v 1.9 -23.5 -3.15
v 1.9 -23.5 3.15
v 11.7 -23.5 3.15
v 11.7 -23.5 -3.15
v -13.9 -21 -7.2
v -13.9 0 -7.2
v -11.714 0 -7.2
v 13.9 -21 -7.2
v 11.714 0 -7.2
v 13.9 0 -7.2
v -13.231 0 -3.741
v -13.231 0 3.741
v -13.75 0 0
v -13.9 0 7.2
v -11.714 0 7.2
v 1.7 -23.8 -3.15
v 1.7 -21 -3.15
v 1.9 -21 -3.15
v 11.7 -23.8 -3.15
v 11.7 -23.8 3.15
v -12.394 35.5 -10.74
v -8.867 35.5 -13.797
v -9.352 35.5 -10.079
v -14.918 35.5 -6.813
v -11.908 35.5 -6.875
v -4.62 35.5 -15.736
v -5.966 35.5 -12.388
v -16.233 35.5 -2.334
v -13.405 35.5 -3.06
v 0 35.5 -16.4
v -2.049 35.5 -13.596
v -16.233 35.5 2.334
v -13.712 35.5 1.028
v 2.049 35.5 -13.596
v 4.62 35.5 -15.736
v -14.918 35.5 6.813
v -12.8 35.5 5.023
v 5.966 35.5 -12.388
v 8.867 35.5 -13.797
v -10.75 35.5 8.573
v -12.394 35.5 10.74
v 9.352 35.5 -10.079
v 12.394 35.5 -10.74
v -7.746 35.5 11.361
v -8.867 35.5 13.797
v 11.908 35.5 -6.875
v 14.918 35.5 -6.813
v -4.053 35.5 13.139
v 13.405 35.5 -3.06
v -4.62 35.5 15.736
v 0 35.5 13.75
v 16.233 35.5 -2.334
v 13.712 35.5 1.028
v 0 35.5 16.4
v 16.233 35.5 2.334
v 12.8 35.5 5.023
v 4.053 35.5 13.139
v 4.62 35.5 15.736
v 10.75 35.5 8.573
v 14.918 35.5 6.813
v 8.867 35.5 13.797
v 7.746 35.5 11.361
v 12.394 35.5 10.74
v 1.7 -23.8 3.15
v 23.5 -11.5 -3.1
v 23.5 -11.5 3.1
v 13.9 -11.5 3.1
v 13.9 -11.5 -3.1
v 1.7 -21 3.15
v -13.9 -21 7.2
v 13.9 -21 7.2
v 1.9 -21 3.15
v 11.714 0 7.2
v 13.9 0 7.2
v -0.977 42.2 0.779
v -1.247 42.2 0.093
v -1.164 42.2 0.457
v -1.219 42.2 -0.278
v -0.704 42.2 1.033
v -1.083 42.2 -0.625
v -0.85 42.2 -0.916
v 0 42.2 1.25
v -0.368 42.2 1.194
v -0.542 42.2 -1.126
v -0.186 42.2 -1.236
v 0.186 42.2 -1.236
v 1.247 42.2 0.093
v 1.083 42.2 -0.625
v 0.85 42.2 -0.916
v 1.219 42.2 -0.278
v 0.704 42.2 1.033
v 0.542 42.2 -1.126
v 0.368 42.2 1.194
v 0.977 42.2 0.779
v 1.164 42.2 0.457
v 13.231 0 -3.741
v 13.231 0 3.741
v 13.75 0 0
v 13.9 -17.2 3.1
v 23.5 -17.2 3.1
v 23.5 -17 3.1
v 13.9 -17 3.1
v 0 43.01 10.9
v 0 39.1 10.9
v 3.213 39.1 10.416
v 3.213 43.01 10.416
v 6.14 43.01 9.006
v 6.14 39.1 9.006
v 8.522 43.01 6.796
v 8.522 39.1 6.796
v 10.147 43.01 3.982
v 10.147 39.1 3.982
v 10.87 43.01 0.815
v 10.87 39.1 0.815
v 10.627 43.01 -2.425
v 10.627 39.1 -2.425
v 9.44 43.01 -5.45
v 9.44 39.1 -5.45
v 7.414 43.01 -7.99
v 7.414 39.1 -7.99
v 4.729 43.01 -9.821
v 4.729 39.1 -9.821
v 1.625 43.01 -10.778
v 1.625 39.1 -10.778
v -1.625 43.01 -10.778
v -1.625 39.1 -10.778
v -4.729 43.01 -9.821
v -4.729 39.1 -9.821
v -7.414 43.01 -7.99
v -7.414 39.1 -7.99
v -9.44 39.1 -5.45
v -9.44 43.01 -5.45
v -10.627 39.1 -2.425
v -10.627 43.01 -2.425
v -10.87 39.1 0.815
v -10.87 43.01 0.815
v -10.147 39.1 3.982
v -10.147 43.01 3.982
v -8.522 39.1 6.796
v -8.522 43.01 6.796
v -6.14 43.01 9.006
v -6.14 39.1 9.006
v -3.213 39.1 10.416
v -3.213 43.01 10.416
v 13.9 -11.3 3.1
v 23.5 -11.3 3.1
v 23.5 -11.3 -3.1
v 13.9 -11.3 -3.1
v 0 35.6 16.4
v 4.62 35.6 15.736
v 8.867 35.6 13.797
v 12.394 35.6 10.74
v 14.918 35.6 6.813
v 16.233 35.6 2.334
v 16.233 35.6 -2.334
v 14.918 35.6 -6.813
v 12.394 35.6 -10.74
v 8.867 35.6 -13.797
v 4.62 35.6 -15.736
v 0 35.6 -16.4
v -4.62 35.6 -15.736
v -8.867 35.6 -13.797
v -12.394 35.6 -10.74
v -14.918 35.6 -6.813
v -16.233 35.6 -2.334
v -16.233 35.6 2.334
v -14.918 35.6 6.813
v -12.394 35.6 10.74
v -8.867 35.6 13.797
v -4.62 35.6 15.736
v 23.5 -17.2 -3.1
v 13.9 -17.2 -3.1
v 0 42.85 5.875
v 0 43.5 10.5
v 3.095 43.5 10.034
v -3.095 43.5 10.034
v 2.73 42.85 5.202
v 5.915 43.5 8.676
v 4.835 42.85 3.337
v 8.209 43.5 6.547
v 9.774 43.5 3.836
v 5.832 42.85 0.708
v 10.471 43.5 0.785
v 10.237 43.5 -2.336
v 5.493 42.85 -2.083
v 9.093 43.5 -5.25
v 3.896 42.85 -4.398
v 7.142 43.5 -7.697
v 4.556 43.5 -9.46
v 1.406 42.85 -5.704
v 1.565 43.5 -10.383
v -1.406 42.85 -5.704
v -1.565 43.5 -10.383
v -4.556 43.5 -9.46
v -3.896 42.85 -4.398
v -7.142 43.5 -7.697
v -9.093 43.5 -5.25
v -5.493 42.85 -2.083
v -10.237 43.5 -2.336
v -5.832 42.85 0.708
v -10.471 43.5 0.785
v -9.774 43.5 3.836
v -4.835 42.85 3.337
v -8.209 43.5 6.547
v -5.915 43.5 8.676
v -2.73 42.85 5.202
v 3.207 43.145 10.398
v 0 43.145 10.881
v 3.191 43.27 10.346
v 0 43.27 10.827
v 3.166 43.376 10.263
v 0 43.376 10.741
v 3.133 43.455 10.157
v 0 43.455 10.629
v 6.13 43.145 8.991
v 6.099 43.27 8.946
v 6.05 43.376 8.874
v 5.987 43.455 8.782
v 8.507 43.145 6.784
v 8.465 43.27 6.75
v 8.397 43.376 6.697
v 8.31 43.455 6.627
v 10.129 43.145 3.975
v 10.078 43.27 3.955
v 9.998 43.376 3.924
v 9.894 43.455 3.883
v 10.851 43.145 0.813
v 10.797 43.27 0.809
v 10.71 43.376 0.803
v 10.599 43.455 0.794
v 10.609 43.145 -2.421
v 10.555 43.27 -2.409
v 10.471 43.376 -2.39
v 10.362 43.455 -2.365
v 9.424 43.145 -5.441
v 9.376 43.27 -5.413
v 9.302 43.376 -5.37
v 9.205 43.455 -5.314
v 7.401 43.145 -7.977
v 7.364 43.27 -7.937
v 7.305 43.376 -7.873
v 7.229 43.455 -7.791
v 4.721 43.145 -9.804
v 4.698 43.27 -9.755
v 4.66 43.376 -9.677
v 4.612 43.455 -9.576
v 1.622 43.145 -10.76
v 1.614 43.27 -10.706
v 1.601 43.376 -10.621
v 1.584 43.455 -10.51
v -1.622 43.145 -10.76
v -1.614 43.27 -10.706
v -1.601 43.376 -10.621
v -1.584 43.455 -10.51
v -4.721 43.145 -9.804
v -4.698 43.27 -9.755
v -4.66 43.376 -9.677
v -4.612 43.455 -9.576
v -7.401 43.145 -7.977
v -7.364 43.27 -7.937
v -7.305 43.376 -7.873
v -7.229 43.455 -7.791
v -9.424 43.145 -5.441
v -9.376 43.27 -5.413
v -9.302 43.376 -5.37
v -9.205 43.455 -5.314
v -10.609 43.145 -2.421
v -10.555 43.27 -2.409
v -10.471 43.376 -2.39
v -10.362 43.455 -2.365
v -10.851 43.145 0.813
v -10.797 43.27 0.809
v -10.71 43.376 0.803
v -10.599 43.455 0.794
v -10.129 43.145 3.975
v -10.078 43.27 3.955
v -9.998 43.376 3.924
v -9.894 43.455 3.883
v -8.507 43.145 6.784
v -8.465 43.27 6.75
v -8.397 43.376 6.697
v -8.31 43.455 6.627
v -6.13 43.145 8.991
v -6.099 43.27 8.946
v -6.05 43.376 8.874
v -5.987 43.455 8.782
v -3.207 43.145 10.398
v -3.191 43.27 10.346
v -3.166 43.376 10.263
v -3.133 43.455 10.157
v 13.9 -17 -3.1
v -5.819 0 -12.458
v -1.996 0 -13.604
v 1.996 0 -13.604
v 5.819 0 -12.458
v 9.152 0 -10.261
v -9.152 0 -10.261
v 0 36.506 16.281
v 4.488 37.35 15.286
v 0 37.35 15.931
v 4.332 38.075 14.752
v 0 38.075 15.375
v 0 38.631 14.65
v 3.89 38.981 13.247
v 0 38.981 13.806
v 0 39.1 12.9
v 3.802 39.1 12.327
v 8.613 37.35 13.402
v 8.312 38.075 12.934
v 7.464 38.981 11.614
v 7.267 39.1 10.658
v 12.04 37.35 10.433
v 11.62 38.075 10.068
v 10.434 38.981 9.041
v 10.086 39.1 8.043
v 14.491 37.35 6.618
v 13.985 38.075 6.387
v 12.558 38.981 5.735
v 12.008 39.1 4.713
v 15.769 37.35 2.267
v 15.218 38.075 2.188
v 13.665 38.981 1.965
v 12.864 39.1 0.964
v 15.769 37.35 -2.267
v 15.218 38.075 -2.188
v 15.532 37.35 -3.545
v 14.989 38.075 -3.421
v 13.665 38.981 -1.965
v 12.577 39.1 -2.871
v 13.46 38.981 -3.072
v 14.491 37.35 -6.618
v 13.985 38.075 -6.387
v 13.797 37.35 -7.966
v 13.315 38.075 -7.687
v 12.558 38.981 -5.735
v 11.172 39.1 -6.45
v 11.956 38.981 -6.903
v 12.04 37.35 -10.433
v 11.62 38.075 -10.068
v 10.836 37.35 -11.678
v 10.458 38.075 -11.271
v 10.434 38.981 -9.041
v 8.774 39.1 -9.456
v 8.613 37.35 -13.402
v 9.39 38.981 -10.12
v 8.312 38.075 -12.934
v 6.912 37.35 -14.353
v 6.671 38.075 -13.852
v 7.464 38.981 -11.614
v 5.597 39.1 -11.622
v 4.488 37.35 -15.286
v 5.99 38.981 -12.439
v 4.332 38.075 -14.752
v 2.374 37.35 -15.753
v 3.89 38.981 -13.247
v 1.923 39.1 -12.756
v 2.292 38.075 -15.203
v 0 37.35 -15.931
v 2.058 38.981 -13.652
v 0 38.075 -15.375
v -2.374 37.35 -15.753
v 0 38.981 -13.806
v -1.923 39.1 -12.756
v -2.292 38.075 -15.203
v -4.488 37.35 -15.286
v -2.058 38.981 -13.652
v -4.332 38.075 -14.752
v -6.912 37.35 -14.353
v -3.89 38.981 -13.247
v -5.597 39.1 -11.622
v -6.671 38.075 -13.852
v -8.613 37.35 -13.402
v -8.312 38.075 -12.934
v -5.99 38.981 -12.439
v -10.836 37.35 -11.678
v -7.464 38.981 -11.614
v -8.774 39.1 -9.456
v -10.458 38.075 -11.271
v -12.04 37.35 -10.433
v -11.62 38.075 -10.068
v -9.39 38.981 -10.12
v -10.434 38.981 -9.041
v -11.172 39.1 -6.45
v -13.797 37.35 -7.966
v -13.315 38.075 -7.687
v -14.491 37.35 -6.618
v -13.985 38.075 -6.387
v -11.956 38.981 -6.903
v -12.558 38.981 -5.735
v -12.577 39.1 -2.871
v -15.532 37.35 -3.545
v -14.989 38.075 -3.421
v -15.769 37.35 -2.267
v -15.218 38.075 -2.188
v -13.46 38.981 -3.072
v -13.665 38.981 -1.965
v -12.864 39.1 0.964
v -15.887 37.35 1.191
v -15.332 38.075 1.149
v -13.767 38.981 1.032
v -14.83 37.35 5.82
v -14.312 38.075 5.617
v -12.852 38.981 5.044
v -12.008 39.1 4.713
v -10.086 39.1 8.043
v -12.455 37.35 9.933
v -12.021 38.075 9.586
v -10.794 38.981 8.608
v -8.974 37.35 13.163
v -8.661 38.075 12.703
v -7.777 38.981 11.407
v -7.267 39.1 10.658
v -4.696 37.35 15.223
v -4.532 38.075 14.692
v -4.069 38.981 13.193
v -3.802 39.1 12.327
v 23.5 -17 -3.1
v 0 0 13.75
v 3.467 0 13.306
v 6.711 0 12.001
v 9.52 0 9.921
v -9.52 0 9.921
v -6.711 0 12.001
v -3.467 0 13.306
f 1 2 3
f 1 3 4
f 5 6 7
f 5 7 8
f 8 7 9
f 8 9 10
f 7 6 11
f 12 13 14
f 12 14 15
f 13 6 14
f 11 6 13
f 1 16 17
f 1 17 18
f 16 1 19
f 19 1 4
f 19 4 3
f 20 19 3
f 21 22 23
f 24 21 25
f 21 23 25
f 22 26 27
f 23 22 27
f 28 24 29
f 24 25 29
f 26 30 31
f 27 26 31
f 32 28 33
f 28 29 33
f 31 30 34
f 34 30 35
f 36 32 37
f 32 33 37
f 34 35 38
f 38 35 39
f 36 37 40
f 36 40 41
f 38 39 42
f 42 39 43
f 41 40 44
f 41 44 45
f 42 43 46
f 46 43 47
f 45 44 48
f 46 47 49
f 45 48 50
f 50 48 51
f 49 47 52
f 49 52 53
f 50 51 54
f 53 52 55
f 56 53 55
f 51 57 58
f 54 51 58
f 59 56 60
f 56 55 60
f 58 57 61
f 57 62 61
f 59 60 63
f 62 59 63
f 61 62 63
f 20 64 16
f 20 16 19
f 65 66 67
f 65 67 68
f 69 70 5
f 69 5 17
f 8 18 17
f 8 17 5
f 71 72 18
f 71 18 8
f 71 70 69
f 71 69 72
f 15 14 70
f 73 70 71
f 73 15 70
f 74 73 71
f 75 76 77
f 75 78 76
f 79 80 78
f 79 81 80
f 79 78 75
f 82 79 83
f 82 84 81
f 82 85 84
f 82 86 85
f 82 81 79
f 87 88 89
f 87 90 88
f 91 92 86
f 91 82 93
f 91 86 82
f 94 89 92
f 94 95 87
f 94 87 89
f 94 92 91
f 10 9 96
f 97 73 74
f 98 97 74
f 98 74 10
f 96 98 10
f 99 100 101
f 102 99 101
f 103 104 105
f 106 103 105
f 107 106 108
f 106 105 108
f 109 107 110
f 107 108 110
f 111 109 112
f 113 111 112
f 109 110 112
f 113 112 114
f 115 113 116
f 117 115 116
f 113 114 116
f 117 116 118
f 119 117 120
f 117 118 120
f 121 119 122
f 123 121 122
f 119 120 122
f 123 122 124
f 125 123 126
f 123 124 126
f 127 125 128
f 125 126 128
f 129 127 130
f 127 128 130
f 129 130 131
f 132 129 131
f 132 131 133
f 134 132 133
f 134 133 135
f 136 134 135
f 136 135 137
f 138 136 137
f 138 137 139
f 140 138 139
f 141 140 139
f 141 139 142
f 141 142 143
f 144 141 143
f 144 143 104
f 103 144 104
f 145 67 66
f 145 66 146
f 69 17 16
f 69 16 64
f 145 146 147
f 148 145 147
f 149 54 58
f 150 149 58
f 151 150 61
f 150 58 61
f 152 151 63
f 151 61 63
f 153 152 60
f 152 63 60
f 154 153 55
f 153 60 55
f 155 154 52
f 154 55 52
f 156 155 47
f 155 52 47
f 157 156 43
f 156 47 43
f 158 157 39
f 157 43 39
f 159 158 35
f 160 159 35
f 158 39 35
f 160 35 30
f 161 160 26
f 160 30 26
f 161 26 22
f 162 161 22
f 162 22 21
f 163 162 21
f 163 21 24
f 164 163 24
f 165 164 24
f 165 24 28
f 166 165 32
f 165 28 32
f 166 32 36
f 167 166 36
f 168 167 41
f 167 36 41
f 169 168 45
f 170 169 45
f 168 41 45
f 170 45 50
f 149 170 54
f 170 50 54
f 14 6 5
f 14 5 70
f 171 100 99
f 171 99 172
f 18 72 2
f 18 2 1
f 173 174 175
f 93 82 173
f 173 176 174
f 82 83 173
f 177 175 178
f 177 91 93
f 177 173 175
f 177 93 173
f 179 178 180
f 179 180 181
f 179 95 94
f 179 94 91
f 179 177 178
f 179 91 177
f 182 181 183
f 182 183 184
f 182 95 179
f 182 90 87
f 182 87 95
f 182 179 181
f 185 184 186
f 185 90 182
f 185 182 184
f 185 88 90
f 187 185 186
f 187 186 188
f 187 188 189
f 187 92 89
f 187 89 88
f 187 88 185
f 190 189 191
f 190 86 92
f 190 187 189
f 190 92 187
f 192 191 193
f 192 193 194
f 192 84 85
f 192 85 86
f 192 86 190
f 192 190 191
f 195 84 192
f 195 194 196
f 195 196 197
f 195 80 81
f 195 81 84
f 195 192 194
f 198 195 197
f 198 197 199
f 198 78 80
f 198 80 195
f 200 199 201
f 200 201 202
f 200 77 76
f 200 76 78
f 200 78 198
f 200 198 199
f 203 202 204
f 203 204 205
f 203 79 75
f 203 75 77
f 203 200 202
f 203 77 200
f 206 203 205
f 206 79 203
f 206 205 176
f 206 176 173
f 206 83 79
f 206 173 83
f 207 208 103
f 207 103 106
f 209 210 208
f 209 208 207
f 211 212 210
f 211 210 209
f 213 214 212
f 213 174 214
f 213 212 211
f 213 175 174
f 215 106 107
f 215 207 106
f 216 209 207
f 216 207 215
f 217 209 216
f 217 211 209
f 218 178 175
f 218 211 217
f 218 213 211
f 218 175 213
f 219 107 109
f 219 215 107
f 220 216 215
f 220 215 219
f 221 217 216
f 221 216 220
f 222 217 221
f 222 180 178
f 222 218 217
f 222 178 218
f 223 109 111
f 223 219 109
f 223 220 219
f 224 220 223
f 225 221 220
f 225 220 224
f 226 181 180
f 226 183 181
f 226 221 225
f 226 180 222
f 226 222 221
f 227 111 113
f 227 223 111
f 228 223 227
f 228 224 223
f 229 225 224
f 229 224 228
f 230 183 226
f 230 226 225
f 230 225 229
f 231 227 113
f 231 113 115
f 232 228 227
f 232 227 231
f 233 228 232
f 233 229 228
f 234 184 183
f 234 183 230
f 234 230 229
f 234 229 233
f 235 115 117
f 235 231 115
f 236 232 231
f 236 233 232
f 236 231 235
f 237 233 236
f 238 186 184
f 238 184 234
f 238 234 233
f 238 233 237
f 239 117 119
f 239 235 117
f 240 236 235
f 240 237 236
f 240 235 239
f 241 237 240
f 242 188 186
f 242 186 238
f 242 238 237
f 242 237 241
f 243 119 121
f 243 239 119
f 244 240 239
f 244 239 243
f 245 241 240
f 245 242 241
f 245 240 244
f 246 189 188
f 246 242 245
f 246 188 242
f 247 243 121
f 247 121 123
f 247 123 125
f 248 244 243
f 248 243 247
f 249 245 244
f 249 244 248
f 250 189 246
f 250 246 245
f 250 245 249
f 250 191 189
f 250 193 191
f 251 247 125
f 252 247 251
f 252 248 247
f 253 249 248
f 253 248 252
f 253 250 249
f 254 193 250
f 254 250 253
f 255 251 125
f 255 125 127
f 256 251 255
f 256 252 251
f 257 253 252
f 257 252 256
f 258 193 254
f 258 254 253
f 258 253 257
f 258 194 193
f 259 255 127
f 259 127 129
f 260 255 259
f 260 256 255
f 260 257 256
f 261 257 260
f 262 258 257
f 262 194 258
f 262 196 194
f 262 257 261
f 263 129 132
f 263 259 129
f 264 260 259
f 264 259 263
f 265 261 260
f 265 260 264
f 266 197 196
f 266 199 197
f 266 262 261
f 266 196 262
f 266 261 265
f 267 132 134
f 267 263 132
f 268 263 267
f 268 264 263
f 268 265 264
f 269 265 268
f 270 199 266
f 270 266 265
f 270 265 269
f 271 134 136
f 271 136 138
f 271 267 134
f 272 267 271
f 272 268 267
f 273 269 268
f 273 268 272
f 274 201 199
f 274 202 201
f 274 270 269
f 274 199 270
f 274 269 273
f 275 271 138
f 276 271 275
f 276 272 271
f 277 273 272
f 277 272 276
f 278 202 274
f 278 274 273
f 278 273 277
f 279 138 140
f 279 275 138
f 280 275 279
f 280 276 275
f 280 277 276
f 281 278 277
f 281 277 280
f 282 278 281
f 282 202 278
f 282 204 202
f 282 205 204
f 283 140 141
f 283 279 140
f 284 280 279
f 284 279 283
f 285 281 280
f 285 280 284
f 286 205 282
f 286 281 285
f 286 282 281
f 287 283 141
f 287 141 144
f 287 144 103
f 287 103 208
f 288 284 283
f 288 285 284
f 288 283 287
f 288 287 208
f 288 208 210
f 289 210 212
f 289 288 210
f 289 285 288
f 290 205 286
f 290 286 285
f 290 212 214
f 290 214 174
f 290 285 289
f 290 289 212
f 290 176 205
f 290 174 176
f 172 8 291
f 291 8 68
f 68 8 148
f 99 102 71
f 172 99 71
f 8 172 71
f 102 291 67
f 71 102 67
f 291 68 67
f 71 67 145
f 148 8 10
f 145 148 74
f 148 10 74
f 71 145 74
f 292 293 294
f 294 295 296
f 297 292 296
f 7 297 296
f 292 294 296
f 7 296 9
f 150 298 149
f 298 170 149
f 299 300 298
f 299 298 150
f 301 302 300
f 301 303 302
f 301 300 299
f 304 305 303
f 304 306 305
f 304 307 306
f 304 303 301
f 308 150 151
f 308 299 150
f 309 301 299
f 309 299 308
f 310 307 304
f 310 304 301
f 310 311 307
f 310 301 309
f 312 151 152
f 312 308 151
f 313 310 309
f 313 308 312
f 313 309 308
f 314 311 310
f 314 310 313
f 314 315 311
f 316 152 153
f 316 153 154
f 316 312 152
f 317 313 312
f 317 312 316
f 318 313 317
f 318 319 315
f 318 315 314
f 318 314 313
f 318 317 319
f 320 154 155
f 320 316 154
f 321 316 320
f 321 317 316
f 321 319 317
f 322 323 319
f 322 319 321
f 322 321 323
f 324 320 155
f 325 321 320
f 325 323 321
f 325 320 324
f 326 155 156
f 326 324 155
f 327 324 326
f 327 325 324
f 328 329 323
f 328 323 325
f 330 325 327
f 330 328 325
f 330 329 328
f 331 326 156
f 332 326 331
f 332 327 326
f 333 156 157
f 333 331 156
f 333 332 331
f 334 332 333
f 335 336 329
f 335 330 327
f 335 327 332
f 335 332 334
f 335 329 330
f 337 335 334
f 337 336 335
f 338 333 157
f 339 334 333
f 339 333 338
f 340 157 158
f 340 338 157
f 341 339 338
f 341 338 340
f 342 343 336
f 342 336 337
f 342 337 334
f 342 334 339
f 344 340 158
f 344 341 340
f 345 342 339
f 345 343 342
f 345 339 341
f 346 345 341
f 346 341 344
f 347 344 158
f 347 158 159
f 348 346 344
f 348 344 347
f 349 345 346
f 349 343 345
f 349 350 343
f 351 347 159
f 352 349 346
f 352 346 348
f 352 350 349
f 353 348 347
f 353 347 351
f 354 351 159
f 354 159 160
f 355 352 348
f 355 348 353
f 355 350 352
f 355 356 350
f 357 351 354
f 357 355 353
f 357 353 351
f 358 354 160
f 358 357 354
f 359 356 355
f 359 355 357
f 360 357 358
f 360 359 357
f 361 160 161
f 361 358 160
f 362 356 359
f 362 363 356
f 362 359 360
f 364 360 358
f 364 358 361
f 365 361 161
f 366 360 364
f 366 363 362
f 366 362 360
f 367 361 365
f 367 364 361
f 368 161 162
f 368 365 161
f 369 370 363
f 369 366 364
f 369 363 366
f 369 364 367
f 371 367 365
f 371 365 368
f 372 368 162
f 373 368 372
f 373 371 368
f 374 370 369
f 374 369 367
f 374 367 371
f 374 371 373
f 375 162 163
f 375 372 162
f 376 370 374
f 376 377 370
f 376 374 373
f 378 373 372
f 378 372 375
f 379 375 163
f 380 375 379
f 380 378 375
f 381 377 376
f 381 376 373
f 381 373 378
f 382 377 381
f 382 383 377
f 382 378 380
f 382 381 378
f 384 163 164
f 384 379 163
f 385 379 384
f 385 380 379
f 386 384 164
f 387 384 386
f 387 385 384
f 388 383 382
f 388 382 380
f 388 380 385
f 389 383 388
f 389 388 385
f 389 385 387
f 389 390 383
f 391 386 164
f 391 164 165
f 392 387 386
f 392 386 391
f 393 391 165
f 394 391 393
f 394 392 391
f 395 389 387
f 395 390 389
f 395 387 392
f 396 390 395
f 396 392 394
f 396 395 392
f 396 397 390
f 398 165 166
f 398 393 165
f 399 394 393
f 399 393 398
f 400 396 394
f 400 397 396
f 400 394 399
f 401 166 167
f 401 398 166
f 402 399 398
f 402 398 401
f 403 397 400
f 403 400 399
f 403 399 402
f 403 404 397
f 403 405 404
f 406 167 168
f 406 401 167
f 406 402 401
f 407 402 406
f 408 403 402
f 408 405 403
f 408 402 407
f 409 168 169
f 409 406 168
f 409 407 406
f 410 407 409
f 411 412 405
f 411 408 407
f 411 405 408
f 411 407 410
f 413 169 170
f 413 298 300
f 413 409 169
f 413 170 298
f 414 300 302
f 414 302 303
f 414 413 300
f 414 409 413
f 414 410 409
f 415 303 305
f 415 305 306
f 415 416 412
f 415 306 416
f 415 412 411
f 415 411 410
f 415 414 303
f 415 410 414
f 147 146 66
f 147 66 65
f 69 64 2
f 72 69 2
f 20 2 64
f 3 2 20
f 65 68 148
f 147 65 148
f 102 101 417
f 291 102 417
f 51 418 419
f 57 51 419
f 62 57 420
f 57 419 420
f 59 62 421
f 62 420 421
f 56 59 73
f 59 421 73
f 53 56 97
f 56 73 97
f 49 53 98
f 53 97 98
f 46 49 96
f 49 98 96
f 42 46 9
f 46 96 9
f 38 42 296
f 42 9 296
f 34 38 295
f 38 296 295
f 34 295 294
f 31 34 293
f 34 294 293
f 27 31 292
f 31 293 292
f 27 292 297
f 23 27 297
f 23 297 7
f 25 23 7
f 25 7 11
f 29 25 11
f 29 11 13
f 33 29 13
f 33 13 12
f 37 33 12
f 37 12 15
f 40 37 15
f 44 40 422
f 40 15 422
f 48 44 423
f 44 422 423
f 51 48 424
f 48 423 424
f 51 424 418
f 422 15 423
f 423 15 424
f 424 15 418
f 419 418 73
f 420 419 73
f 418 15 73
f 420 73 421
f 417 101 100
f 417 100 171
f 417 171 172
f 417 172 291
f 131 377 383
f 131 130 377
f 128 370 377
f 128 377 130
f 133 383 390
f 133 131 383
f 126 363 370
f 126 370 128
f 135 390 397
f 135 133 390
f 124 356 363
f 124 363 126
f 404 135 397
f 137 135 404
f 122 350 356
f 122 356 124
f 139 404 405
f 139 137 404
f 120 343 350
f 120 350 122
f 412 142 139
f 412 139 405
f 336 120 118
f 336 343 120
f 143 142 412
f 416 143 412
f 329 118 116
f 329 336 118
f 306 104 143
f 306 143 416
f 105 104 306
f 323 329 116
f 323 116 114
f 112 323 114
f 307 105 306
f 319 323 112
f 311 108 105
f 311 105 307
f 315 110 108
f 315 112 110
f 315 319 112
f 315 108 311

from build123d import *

# Parameters (mm, degrees)
SKETCH1_R           = 13.75
BOSS_EXTRUDE1_DEPTH = 35.5
SKETCH2_R           = 16.4
BOSS_EXTRUDE2_DEPTH = 3.6
SKETCH3_R           = 10.9
BOSS_EXTRUDE3_DEPTH = 4.4
FILLET1_R           = 3.5
SKETCH4_R           = 0.5
CUT_EXTRUDE1_DEPTH  = 1.3
CHAMFER1_SIZE       = 10
CHAMFER1_SIZE_2     = 1.405408347
FILLET2_R           = 0.5
SKETCH5_W           = 27.8
SKETCH5_H           = 14.4
BOSS_EXTRUDE4_DEPTH = 21
SKETCH6_W           = 10
SKETCH6_H           = 6.3
BOSS_EXTRUDE5_DEPTH = 2.8
SKETCH7_W           = 6.3
SKETCH7_H           = 2.5
CUT_EXTRUDE2_DEPTH  = 9.8
SKETCH8_W           = 6.2
SKETCH8_H           = 0.2
BOSS_EXTRUDE6_DEPTH = 9.6


with BuildPart() as part:
    # Sketch1 → Boss-Extrude1 (new body)
    with BuildSketch(Plane(origin=(0, 0, 0), x_dir=(1, 0, 0), z_dir=(0, 1, 0))):
        with Locations(Location((0, 0, 0), (0, 0, 270))):
            Circle(SKETCH1_R)
    extrude(amount=BOSS_EXTRUDE1_DEPTH)

    # Sketch2 → Boss-Extrude2 (add)
    with BuildSketch(Plane(origin=(0, 35.5, 0), x_dir=(1, 0, 0), z_dir=(0, 1, 0))):
        with Locations(Location((0, 0, 0), (0, 0, 270))):
            Circle(SKETCH2_R)
    extrude(amount=BOSS_EXTRUDE2_DEPTH)

    # Sketch3 → Boss-Extrude3 (add)
    with BuildSketch(Plane(origin=(0, 39.1, 0), x_dir=(1, 0, 0), z_dir=(0, 1, 0))):
        with Locations(Location((0, 0, 0), (0, 0, 270))):
            Circle(SKETCH3_R)
    extrude(amount=BOSS_EXTRUDE3_DEPTH)

    # Fillet1
    fillet1_edges = [part.edges().sort_by_distance(p)[0] for p in [
        (0, 39.1, -16.4),
    ]]
    fillet(fillet1_edges, radius=FILLET1_R)

    # Sketch4 → Cut-Extrude1 (cut)
    with BuildSketch(Plane(origin=(0, 43.5, 0), x_dir=(1, 0, 0), z_dir=(0, 1, 0))):
        with Locations(Location((0, 0, 0), (0, 0, 270))):
            Circle(SKETCH4_R)
    extrude(amount=-CUT_EXTRUDE1_DEPTH, mode=Mode.SUBTRACT)

    # Chamfer1
    # the kernel refuses this chamfer: 10, 1.405408347 mm, written as the material it takes off along each edge
    with BuildSketch(Plane(origin=(0, 43.5, 0), x_dir=(0, 0, 1), z_dir=(-1, 0, 0))) as chamfer1_piece_1_section:
        Polygon((0.5 + CHAMFER1_SIZE, 0), (0.5, -CHAMFER1_SIZE_2), (0.5, 0), align=None)
    chamfer1_piece_1 = revolve(axis=Axis((0, 43.5, 0), (0, 1, 0)), mode=Mode.PRIVATE)
    chamfer1_piece_1 = split(chamfer1_piece_1, bisect_by=Plane(origin=(0, 42.2, -6.064294667), z_dir=(0, 1, 0)), keep=Keep.TOP, mode=Mode.PRIVATE)
    add(chamfer1_piece_1, mode=Mode.SUBTRACT)

    # Fillet2
    # the kernel refuses this fillet: 0.5 mm, written as the material it takes off along each edge
    with BuildSketch(Plane(origin=(0, 43.5, 0), x_dir=(0, 0, 1), z_dir=(-1, 0, 0))) as fillet2_piece_1:
        with BuildLine():
            CenterArc((10.4, -0.489897949), FILLET2_R, 0, 78.463040967)
            Line((10.5, 0), (10.502, 0.009797959))
            ThreePointArc((10.502, 0.009797959), (10.7, 0.01), (10.9, 0.01))
            Line((10.9, 0.01), (10.91, 0))
            Line((10.91, 0), (10.91, -0.489897949))
            Line((10.91, -0.489897949), (10.9, -0.489897949))
        make_face()
    revolve(axis=Axis((0, 43.5, 0), (0, 1, 0)), mode=Mode.SUBTRACT)

    # Sketch5 → Boss-Extrude4 (add)
    with BuildSketch(Plane.XZ):
        Rectangle(SKETCH5_W, SKETCH5_H)
    extrude(amount=BOSS_EXTRUDE4_DEPTH)

    # Sketch6 → Boss-Extrude5 (add)
    with BuildSketch(Plane.XZ.offset(21)):
        with Locations((6.7, 0)):
            Rectangle(SKETCH6_W, SKETCH6_H)
    extrude(amount=BOSS_EXTRUDE5_DEPTH)

    # Sketch7 → Cut-Extrude2 (cut)
    with BuildSketch(Plane(origin=(11.7, 0, 0), x_dir=(0, 0, -1), z_dir=(1, 0, 0))):
        with Locations((0, -22.25)):
            Rectangle(SKETCH7_W, SKETCH7_H)
    extrude(amount=-CUT_EXTRUDE2_DEPTH, mode=Mode.SUBTRACT)

    # Sketch8 → Boss-Extrude6 (add)
    with BuildSketch(Plane(origin=(13.9, 0, 0), x_dir=(0, 0, -1), z_dir=(1, 0, 0))):
        with Locations((0, -17.1)):
            Rectangle(SKETCH8_W, SKETCH8_H)
        with Locations((0, -11.4)):
            Rectangle(SKETCH8_W, SKETCH8_H)
    extrude(amount=BOSS_EXTRUDE6_DEPTH)


solid = part.part
